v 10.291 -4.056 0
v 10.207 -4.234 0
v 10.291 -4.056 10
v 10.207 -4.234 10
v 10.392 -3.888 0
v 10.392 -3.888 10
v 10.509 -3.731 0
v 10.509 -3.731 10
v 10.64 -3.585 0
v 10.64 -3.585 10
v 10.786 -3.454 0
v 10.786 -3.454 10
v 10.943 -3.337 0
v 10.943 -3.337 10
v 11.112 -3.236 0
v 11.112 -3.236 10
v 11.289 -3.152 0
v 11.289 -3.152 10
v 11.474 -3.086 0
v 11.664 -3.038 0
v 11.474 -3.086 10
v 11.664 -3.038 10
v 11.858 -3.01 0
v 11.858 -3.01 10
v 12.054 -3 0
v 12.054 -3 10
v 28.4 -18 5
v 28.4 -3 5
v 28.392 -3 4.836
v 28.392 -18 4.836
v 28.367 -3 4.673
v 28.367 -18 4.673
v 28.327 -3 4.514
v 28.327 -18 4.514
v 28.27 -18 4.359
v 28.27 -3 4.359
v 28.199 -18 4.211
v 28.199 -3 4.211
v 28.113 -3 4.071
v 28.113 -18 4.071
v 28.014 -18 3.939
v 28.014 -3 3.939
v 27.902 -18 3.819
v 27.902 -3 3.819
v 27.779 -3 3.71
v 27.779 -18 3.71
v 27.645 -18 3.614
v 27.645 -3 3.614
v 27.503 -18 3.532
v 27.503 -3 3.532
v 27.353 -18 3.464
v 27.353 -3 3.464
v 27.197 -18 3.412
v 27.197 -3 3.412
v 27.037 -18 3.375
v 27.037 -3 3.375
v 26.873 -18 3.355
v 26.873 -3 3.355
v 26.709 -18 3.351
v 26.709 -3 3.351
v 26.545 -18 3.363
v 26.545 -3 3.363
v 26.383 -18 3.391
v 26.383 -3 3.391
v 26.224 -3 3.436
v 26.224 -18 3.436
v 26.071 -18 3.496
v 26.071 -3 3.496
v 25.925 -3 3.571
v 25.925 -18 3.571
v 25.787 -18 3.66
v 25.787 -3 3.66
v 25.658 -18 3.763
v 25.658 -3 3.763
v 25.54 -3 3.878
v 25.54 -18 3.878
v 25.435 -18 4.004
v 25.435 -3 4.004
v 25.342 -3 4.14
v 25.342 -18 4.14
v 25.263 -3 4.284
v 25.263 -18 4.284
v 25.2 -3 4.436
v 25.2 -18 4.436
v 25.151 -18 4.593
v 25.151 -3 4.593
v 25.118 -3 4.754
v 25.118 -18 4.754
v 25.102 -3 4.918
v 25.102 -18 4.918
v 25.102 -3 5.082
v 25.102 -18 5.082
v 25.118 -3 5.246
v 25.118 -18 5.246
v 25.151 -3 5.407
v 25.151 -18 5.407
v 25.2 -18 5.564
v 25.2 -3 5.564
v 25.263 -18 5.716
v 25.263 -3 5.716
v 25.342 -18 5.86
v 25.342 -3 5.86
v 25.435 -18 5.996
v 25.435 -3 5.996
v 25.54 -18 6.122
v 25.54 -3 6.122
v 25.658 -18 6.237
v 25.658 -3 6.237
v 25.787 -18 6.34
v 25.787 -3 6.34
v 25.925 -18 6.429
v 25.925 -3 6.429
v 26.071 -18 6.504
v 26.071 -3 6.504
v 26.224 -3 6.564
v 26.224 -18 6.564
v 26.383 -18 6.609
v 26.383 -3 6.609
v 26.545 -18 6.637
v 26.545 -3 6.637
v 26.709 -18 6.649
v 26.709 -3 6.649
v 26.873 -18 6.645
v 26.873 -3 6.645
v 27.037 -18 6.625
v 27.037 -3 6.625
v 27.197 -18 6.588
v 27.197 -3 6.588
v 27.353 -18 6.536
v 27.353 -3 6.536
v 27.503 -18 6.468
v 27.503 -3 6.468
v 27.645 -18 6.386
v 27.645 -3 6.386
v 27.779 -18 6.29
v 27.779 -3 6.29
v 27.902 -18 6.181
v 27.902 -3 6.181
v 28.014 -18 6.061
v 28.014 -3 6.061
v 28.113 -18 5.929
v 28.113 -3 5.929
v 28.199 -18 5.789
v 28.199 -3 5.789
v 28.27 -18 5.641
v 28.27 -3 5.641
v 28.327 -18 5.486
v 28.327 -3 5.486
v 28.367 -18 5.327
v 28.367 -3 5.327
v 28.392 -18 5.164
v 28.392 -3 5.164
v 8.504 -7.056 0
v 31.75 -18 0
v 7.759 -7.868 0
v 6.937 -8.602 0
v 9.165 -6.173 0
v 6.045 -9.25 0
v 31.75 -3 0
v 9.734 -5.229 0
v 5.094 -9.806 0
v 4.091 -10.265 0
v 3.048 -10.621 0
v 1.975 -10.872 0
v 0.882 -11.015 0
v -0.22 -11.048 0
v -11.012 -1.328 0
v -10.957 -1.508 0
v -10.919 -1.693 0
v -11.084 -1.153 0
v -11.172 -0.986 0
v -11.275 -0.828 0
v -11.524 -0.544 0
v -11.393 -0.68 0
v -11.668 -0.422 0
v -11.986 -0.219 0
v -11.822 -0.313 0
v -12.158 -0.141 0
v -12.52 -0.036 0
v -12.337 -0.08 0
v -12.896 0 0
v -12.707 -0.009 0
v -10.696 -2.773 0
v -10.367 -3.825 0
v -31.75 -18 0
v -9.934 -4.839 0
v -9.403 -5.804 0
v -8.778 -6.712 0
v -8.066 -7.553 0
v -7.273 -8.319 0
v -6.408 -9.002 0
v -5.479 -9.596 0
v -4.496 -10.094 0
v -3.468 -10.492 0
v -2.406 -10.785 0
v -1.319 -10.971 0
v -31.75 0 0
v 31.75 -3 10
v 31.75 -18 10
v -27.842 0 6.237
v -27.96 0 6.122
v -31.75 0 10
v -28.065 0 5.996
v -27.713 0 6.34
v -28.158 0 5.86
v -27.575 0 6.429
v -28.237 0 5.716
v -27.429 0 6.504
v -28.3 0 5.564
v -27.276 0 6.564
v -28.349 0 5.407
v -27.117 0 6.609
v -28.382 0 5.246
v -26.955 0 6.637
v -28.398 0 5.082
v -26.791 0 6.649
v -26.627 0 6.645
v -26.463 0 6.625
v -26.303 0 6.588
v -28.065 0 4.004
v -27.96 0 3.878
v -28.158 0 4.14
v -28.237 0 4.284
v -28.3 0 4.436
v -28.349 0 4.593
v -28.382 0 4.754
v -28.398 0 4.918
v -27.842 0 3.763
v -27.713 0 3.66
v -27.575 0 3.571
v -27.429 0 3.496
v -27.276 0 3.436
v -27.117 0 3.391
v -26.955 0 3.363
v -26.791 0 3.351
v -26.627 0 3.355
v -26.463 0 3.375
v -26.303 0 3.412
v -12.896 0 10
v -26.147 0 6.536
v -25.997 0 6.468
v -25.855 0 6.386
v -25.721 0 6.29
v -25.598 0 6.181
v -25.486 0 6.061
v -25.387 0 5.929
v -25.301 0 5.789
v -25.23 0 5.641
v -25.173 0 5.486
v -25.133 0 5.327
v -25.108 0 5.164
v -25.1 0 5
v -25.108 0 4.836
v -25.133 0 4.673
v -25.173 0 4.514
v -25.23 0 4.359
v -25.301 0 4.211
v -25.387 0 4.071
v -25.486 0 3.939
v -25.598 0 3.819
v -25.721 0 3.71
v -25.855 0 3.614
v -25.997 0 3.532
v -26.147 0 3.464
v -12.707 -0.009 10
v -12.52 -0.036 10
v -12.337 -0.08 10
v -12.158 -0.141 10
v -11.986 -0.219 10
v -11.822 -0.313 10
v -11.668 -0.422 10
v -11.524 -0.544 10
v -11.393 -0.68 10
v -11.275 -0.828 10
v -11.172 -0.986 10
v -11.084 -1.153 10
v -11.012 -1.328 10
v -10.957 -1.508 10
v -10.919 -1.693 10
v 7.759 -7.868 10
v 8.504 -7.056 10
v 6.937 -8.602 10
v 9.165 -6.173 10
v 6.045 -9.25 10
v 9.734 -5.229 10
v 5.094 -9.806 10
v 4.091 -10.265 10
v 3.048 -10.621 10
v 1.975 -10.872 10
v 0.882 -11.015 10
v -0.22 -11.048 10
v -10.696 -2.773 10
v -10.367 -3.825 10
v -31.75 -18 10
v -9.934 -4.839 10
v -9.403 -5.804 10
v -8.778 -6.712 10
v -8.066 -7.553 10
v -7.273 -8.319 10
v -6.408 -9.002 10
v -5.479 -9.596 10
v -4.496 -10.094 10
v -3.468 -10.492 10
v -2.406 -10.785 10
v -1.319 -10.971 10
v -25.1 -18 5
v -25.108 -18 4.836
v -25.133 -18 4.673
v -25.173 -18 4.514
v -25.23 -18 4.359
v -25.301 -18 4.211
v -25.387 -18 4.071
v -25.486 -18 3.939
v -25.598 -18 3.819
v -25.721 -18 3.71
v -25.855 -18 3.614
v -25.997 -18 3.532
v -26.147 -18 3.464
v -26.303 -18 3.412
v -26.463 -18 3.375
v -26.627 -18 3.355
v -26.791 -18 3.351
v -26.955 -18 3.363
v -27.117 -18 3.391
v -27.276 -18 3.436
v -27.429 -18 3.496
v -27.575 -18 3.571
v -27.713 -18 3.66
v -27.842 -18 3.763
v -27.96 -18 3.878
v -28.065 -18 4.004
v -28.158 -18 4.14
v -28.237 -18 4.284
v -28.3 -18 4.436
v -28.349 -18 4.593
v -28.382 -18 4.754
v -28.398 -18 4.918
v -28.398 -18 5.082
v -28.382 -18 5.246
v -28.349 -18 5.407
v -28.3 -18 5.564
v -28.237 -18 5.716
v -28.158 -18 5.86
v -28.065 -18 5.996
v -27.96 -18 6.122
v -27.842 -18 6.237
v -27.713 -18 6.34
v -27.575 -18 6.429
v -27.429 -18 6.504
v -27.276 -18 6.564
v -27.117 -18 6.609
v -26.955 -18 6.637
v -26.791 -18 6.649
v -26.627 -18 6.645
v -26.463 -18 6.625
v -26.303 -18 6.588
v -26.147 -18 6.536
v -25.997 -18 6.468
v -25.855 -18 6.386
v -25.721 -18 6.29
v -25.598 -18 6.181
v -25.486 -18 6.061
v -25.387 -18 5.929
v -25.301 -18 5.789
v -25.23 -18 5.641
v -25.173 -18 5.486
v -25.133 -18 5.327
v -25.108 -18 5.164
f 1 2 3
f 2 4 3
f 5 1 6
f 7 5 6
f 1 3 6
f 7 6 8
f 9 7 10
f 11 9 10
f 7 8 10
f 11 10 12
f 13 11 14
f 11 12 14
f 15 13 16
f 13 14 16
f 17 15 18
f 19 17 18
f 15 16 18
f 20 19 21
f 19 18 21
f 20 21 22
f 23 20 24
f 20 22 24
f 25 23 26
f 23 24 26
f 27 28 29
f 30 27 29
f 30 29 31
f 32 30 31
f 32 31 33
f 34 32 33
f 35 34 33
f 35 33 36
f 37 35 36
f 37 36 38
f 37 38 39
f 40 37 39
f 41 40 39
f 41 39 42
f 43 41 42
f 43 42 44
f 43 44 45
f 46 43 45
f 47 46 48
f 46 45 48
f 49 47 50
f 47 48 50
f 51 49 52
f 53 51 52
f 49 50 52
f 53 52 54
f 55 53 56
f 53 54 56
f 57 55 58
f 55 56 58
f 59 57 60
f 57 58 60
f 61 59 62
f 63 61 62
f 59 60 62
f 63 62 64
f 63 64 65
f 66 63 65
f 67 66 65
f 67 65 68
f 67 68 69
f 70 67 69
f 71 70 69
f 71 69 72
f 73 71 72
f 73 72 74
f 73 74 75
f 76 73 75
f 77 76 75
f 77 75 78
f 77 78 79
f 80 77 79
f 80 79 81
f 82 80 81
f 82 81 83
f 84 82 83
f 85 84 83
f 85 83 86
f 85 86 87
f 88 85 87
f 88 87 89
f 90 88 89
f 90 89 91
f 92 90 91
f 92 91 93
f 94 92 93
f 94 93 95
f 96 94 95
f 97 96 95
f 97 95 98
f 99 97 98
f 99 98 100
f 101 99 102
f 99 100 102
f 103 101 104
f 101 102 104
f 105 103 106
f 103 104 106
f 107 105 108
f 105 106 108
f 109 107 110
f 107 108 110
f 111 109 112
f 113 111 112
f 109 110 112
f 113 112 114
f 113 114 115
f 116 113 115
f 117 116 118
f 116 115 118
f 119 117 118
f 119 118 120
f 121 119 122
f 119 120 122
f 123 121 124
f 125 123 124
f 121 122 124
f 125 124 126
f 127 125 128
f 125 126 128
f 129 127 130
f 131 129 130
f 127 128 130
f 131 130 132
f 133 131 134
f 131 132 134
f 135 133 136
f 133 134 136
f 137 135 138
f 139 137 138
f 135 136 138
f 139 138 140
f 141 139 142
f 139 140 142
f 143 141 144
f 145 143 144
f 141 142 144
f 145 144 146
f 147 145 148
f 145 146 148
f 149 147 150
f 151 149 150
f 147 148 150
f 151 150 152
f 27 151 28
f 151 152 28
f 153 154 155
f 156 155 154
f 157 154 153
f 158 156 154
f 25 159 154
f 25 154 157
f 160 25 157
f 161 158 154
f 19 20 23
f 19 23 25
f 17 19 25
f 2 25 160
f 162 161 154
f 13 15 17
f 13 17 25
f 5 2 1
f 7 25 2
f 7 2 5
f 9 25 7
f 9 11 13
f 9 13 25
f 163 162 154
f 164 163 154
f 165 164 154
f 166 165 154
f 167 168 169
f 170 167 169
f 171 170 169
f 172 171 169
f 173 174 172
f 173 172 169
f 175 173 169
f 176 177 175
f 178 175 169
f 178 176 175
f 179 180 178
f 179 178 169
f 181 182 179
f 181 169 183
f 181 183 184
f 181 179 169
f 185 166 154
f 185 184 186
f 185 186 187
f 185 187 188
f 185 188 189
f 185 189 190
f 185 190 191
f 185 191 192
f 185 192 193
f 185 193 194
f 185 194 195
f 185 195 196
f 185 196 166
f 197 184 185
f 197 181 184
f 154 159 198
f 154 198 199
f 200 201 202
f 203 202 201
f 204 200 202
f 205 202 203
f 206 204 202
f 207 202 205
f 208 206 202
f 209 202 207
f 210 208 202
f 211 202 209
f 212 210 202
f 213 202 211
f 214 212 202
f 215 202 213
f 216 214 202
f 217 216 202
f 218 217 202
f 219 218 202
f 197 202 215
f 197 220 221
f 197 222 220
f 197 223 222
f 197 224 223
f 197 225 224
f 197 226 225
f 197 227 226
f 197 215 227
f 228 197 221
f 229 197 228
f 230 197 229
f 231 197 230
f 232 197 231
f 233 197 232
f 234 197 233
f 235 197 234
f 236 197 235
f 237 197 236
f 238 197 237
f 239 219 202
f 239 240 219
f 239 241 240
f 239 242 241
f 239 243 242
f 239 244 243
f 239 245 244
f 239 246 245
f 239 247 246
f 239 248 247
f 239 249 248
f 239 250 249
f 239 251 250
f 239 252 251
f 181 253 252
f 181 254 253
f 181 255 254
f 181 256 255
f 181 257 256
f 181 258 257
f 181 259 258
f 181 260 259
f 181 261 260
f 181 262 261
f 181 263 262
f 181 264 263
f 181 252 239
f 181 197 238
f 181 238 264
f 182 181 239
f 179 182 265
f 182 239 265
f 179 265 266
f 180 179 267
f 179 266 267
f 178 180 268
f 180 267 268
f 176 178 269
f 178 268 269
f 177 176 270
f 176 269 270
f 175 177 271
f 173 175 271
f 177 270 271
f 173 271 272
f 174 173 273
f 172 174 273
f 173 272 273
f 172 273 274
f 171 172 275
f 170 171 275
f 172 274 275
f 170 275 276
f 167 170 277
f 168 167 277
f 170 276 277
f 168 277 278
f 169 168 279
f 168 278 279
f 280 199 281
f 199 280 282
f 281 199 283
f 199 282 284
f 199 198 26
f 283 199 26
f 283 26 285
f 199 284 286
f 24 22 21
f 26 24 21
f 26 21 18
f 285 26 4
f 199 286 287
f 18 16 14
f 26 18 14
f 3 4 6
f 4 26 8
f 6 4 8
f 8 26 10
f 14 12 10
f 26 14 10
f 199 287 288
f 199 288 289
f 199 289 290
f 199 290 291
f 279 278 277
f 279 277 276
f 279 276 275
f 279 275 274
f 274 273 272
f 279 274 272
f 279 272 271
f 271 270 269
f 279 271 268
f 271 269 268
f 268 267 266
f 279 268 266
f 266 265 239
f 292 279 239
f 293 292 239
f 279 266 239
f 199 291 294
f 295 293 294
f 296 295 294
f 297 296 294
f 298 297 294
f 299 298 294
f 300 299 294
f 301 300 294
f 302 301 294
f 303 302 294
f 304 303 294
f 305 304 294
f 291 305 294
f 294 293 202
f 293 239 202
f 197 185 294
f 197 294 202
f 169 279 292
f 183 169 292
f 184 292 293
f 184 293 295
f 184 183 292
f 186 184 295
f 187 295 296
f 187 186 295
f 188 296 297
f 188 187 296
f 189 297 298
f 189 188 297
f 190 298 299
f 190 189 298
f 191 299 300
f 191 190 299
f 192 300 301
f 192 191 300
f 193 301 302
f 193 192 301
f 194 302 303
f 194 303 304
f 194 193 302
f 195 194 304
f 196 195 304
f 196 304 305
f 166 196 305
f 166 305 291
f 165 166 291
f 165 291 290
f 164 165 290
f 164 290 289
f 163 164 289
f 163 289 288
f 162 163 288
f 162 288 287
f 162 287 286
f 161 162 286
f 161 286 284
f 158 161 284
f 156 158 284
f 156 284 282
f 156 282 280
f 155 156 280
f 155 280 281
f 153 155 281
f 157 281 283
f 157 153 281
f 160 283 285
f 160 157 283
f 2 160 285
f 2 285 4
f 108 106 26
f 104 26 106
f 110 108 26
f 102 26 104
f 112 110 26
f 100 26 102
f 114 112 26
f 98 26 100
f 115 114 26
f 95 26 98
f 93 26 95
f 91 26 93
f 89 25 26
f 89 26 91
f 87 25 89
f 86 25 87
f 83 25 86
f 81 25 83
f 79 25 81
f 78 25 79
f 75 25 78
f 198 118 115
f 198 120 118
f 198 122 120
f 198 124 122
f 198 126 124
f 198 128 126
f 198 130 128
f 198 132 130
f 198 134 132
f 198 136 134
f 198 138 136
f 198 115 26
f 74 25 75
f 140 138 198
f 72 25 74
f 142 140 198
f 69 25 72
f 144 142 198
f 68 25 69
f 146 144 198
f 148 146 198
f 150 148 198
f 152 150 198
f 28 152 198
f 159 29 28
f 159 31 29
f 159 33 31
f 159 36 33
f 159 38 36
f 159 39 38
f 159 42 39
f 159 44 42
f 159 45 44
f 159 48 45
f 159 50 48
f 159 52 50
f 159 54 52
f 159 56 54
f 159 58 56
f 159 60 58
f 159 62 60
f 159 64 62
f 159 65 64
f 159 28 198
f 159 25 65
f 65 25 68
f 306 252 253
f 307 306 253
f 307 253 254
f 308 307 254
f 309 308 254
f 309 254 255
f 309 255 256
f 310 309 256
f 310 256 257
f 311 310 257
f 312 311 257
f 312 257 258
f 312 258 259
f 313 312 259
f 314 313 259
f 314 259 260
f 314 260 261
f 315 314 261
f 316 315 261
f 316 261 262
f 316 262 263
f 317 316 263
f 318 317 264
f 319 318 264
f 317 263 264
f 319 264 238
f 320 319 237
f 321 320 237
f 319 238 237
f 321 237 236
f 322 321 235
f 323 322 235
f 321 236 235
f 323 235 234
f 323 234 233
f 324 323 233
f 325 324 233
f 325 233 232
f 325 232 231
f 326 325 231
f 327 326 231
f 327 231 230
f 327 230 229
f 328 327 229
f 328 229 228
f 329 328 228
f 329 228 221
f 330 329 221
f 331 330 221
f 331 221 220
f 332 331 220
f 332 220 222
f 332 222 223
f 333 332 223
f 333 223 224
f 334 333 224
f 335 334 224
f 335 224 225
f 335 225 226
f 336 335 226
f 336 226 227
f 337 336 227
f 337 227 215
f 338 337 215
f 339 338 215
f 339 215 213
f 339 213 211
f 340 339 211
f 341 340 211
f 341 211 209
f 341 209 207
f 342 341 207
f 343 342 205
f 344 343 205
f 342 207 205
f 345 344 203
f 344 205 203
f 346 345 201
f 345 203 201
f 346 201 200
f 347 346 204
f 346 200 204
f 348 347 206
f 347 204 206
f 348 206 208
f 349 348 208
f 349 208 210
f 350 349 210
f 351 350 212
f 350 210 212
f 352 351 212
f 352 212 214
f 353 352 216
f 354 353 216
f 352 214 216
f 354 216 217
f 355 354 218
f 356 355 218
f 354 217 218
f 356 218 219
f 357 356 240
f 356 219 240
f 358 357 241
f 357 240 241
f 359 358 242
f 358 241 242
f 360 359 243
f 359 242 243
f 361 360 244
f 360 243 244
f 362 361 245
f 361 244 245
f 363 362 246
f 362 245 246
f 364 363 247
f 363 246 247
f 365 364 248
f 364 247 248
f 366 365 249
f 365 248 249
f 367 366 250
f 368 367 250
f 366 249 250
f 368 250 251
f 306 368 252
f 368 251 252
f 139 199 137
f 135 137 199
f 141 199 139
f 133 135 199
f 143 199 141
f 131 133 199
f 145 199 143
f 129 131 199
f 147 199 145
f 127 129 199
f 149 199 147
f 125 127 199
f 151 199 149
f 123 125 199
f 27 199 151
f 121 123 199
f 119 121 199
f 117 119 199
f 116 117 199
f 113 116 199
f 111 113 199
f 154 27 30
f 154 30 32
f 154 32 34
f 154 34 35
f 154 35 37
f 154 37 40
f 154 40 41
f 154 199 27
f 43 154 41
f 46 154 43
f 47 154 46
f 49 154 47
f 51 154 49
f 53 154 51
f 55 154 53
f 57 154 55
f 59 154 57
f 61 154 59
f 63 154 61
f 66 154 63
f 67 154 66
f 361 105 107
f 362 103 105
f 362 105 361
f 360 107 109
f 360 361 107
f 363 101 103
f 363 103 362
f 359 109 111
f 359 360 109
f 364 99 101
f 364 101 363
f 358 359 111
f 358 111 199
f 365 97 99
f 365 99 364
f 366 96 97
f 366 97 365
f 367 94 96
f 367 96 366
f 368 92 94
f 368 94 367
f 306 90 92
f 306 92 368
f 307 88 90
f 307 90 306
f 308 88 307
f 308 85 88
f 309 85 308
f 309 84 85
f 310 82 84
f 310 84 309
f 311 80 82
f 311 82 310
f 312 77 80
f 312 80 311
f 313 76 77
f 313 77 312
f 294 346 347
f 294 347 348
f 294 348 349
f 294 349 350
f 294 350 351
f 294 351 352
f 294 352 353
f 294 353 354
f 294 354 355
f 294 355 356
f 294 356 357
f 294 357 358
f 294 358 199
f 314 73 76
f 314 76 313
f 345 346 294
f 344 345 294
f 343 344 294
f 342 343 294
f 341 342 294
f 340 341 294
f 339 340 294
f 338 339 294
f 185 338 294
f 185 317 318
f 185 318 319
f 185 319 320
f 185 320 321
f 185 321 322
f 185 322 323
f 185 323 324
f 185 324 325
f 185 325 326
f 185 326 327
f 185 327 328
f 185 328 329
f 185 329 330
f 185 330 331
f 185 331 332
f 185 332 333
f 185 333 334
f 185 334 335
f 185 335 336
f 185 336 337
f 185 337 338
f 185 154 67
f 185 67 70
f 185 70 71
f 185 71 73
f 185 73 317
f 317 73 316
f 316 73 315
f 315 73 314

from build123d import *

# Parameters (mm, degrees)
EXTRUDE_1_DEPTH = 10
M4X0_71_D       = 3.3
FILLET_2_R      = 2


with BuildPart() as part:
    # Эскиз1 → Бобышка-Вытянуть1 (new body)
    with BuildSketch(Plane.XY):
        with BuildLine():
            Line((-31.75, 0), (-11.05, 0))
            ThreePointArc((-11.05, 0), (-1.514286407, -10.945749708), (10.634965914, -3))
            Line((10.634965914, -3), (31.75, -3))
            Line((31.75, -3), (31.75, -18))
            Line((31.75, -18), (-31.75, -18))
            Line((-31.75, -18), (-31.75, 0))
        make_face()
    extrude(amount=EXTRUDE_1_DEPTH)

    # Отверстие обработанное метчиком M4x0.71 (through all)
    with Locations(Plane(origin=(0, -18, 0), x_dir=(-1, 0, 0), z_dir=(0, -1, 0))):
        with Locations((26.75, -5), (-26.75, -5)):
            Hole(M4X0_71_D / 2)

    # Скругление2
    fillet_2_edges = [part.edges().sort_by_distance(p)[0] for p in [
        (-11.05, 0, 5),
        (10.634965914, -3, 5),
    ]]
    fillet(fillet_2_edges, radius=FILLET_2_R)


solid = part.part
